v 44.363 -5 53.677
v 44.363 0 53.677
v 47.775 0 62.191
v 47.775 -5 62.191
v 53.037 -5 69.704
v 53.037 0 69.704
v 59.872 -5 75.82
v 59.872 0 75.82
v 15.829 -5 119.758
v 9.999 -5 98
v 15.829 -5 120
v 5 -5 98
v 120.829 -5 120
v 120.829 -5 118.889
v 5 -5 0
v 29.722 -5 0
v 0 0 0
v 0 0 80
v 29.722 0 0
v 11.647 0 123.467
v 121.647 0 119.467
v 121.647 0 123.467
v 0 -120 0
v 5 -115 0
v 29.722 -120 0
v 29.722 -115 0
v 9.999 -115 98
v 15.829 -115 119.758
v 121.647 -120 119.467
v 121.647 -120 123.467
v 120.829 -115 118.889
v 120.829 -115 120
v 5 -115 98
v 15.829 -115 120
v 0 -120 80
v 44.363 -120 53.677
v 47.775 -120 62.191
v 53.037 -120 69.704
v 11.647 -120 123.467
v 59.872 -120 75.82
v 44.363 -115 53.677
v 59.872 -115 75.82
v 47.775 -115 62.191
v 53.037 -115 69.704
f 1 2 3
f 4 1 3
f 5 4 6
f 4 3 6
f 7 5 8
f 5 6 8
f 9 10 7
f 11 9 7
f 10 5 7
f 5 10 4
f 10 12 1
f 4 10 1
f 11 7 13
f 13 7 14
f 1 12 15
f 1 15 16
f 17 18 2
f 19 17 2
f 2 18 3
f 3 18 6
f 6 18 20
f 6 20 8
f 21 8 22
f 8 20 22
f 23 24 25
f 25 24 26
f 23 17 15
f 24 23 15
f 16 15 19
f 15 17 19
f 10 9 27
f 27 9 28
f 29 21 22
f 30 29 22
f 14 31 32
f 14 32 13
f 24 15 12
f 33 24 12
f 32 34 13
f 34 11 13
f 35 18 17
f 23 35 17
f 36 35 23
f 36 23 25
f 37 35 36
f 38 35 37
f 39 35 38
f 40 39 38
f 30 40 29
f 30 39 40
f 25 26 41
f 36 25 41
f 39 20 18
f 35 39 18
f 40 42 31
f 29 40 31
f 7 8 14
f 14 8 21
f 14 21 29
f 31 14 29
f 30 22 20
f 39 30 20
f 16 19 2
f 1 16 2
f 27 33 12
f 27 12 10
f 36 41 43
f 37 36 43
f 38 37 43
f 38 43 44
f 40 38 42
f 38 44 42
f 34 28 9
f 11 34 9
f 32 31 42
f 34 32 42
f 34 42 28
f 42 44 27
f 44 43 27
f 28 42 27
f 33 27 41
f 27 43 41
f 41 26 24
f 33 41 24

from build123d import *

# Parameters (mm, degrees)
F1_DEPTH  = 120
F2_W      = 85.2778990954
F2_H      = 80
F3_DEPTH  = 98
F6_DEPTH  = 80
F7_W      = 105
F7_H      = 80
F8_DEPTH  = 120
F9_DEPTH  = 15
F10_DEPTH = 30
F11_DEPTH = 15


with BuildPart() as f1:
    # F0 (on Front) → F1 (new body)
    with BuildSketch(Plane.XZ):
        with BuildLine():
            Line((0, 80), (0, 0))
            Line((0, 0), (29.7221009046, 0))
            Line((29.7221009046, 0), (44.3633417849, 53.6774845415))
            ThreePointArc((44.3633417849, 53.6774845415), (50.1903143406, 66.0986305535), (59.871849565, 75.8200683645))
            Line((59.871849565, 75.8200683645), (121.6468570296, 119.466662183))
            Line((121.6468570296, 119.466662183), (121.6468570296, 123.466662183))
            Line((121.6468570296, 123.466662183), (11.6468570296, 123.466662183))
            Line((11.6468570296, 123.466662183), (0, 80))
        make_face()
    extrude(amount=F1_DEPTH)

    # F2 (on face) → F3 (cut)
    with BuildSketch(Plane(origin=(0, 0, 0), x_dir=(1, 0, 0), z_dir=(0, 0, -1))):
        with Locations((72.3610504523, 60)):
            Rectangle(F2_W, F2_H)
        Polygon((5, 100), (5, 60), (5, 20), (29.7221009046, 20), (29.7221009046, 100), align=None)
    extrude(amount=-F3_DEPTH, mode=Mode.SUBTRACT)

    # F5 (on offset) → F6 (cut)
    with BuildSketch(Plane(origin=(-15.1703708686, 0, 4.0648886231), x_dir=(0, -1, 0), z_dir=(-0.9659258263, 0, 0.2588190451))):
        Polygon((115, 79.7740661031), (115, 99.7740661031), (115, 119.7740661031), (35, 119.7740661031), (35, 79.7740661031), align=None)
    extrude(amount=-F6_DEPTH, mode=Mode.SUBTRACT)

    # F7 (on Top) → F8 (cut)
    with BuildSketch(Plane.XY):
        with Locations((68.3294385483, -75)):
            Rectangle(F7_W, F7_H)
    extrude(amount=F8_DEPTH, mode=Mode.SUBTRACT)

    # F9 (cut): a face of the model
    f9_faces = [f1.faces().sort_by_distance(p)[0] for p in [
        (29.9652985241, -20, 58.8911596381),
    ]]
    extrude(f9_faces, amount=-F9_DEPTH, mode=Mode.SUBTRACT)

    # F10 (cut): a face of the model
    f10_faces = [f1.faces().sort_by_distance(p)[0] for p in [
        (60.278784087, -35, 109.488672273),
    ]]
    extrude(f10_faces, amount=-F10_DEPTH, mode=Mode.SUBTRACT)

    # F11 (cut): a face of the model
    f11_faces = [f1.faces().sort_by_distance(p)[0] for p in [
        (10.1941550896, -100, 42.5407610302),
    ]]
    extrude(f11_faces, amount=-F11_DEPTH, mode=Mode.SUBTRACT)


solid = f1.part
